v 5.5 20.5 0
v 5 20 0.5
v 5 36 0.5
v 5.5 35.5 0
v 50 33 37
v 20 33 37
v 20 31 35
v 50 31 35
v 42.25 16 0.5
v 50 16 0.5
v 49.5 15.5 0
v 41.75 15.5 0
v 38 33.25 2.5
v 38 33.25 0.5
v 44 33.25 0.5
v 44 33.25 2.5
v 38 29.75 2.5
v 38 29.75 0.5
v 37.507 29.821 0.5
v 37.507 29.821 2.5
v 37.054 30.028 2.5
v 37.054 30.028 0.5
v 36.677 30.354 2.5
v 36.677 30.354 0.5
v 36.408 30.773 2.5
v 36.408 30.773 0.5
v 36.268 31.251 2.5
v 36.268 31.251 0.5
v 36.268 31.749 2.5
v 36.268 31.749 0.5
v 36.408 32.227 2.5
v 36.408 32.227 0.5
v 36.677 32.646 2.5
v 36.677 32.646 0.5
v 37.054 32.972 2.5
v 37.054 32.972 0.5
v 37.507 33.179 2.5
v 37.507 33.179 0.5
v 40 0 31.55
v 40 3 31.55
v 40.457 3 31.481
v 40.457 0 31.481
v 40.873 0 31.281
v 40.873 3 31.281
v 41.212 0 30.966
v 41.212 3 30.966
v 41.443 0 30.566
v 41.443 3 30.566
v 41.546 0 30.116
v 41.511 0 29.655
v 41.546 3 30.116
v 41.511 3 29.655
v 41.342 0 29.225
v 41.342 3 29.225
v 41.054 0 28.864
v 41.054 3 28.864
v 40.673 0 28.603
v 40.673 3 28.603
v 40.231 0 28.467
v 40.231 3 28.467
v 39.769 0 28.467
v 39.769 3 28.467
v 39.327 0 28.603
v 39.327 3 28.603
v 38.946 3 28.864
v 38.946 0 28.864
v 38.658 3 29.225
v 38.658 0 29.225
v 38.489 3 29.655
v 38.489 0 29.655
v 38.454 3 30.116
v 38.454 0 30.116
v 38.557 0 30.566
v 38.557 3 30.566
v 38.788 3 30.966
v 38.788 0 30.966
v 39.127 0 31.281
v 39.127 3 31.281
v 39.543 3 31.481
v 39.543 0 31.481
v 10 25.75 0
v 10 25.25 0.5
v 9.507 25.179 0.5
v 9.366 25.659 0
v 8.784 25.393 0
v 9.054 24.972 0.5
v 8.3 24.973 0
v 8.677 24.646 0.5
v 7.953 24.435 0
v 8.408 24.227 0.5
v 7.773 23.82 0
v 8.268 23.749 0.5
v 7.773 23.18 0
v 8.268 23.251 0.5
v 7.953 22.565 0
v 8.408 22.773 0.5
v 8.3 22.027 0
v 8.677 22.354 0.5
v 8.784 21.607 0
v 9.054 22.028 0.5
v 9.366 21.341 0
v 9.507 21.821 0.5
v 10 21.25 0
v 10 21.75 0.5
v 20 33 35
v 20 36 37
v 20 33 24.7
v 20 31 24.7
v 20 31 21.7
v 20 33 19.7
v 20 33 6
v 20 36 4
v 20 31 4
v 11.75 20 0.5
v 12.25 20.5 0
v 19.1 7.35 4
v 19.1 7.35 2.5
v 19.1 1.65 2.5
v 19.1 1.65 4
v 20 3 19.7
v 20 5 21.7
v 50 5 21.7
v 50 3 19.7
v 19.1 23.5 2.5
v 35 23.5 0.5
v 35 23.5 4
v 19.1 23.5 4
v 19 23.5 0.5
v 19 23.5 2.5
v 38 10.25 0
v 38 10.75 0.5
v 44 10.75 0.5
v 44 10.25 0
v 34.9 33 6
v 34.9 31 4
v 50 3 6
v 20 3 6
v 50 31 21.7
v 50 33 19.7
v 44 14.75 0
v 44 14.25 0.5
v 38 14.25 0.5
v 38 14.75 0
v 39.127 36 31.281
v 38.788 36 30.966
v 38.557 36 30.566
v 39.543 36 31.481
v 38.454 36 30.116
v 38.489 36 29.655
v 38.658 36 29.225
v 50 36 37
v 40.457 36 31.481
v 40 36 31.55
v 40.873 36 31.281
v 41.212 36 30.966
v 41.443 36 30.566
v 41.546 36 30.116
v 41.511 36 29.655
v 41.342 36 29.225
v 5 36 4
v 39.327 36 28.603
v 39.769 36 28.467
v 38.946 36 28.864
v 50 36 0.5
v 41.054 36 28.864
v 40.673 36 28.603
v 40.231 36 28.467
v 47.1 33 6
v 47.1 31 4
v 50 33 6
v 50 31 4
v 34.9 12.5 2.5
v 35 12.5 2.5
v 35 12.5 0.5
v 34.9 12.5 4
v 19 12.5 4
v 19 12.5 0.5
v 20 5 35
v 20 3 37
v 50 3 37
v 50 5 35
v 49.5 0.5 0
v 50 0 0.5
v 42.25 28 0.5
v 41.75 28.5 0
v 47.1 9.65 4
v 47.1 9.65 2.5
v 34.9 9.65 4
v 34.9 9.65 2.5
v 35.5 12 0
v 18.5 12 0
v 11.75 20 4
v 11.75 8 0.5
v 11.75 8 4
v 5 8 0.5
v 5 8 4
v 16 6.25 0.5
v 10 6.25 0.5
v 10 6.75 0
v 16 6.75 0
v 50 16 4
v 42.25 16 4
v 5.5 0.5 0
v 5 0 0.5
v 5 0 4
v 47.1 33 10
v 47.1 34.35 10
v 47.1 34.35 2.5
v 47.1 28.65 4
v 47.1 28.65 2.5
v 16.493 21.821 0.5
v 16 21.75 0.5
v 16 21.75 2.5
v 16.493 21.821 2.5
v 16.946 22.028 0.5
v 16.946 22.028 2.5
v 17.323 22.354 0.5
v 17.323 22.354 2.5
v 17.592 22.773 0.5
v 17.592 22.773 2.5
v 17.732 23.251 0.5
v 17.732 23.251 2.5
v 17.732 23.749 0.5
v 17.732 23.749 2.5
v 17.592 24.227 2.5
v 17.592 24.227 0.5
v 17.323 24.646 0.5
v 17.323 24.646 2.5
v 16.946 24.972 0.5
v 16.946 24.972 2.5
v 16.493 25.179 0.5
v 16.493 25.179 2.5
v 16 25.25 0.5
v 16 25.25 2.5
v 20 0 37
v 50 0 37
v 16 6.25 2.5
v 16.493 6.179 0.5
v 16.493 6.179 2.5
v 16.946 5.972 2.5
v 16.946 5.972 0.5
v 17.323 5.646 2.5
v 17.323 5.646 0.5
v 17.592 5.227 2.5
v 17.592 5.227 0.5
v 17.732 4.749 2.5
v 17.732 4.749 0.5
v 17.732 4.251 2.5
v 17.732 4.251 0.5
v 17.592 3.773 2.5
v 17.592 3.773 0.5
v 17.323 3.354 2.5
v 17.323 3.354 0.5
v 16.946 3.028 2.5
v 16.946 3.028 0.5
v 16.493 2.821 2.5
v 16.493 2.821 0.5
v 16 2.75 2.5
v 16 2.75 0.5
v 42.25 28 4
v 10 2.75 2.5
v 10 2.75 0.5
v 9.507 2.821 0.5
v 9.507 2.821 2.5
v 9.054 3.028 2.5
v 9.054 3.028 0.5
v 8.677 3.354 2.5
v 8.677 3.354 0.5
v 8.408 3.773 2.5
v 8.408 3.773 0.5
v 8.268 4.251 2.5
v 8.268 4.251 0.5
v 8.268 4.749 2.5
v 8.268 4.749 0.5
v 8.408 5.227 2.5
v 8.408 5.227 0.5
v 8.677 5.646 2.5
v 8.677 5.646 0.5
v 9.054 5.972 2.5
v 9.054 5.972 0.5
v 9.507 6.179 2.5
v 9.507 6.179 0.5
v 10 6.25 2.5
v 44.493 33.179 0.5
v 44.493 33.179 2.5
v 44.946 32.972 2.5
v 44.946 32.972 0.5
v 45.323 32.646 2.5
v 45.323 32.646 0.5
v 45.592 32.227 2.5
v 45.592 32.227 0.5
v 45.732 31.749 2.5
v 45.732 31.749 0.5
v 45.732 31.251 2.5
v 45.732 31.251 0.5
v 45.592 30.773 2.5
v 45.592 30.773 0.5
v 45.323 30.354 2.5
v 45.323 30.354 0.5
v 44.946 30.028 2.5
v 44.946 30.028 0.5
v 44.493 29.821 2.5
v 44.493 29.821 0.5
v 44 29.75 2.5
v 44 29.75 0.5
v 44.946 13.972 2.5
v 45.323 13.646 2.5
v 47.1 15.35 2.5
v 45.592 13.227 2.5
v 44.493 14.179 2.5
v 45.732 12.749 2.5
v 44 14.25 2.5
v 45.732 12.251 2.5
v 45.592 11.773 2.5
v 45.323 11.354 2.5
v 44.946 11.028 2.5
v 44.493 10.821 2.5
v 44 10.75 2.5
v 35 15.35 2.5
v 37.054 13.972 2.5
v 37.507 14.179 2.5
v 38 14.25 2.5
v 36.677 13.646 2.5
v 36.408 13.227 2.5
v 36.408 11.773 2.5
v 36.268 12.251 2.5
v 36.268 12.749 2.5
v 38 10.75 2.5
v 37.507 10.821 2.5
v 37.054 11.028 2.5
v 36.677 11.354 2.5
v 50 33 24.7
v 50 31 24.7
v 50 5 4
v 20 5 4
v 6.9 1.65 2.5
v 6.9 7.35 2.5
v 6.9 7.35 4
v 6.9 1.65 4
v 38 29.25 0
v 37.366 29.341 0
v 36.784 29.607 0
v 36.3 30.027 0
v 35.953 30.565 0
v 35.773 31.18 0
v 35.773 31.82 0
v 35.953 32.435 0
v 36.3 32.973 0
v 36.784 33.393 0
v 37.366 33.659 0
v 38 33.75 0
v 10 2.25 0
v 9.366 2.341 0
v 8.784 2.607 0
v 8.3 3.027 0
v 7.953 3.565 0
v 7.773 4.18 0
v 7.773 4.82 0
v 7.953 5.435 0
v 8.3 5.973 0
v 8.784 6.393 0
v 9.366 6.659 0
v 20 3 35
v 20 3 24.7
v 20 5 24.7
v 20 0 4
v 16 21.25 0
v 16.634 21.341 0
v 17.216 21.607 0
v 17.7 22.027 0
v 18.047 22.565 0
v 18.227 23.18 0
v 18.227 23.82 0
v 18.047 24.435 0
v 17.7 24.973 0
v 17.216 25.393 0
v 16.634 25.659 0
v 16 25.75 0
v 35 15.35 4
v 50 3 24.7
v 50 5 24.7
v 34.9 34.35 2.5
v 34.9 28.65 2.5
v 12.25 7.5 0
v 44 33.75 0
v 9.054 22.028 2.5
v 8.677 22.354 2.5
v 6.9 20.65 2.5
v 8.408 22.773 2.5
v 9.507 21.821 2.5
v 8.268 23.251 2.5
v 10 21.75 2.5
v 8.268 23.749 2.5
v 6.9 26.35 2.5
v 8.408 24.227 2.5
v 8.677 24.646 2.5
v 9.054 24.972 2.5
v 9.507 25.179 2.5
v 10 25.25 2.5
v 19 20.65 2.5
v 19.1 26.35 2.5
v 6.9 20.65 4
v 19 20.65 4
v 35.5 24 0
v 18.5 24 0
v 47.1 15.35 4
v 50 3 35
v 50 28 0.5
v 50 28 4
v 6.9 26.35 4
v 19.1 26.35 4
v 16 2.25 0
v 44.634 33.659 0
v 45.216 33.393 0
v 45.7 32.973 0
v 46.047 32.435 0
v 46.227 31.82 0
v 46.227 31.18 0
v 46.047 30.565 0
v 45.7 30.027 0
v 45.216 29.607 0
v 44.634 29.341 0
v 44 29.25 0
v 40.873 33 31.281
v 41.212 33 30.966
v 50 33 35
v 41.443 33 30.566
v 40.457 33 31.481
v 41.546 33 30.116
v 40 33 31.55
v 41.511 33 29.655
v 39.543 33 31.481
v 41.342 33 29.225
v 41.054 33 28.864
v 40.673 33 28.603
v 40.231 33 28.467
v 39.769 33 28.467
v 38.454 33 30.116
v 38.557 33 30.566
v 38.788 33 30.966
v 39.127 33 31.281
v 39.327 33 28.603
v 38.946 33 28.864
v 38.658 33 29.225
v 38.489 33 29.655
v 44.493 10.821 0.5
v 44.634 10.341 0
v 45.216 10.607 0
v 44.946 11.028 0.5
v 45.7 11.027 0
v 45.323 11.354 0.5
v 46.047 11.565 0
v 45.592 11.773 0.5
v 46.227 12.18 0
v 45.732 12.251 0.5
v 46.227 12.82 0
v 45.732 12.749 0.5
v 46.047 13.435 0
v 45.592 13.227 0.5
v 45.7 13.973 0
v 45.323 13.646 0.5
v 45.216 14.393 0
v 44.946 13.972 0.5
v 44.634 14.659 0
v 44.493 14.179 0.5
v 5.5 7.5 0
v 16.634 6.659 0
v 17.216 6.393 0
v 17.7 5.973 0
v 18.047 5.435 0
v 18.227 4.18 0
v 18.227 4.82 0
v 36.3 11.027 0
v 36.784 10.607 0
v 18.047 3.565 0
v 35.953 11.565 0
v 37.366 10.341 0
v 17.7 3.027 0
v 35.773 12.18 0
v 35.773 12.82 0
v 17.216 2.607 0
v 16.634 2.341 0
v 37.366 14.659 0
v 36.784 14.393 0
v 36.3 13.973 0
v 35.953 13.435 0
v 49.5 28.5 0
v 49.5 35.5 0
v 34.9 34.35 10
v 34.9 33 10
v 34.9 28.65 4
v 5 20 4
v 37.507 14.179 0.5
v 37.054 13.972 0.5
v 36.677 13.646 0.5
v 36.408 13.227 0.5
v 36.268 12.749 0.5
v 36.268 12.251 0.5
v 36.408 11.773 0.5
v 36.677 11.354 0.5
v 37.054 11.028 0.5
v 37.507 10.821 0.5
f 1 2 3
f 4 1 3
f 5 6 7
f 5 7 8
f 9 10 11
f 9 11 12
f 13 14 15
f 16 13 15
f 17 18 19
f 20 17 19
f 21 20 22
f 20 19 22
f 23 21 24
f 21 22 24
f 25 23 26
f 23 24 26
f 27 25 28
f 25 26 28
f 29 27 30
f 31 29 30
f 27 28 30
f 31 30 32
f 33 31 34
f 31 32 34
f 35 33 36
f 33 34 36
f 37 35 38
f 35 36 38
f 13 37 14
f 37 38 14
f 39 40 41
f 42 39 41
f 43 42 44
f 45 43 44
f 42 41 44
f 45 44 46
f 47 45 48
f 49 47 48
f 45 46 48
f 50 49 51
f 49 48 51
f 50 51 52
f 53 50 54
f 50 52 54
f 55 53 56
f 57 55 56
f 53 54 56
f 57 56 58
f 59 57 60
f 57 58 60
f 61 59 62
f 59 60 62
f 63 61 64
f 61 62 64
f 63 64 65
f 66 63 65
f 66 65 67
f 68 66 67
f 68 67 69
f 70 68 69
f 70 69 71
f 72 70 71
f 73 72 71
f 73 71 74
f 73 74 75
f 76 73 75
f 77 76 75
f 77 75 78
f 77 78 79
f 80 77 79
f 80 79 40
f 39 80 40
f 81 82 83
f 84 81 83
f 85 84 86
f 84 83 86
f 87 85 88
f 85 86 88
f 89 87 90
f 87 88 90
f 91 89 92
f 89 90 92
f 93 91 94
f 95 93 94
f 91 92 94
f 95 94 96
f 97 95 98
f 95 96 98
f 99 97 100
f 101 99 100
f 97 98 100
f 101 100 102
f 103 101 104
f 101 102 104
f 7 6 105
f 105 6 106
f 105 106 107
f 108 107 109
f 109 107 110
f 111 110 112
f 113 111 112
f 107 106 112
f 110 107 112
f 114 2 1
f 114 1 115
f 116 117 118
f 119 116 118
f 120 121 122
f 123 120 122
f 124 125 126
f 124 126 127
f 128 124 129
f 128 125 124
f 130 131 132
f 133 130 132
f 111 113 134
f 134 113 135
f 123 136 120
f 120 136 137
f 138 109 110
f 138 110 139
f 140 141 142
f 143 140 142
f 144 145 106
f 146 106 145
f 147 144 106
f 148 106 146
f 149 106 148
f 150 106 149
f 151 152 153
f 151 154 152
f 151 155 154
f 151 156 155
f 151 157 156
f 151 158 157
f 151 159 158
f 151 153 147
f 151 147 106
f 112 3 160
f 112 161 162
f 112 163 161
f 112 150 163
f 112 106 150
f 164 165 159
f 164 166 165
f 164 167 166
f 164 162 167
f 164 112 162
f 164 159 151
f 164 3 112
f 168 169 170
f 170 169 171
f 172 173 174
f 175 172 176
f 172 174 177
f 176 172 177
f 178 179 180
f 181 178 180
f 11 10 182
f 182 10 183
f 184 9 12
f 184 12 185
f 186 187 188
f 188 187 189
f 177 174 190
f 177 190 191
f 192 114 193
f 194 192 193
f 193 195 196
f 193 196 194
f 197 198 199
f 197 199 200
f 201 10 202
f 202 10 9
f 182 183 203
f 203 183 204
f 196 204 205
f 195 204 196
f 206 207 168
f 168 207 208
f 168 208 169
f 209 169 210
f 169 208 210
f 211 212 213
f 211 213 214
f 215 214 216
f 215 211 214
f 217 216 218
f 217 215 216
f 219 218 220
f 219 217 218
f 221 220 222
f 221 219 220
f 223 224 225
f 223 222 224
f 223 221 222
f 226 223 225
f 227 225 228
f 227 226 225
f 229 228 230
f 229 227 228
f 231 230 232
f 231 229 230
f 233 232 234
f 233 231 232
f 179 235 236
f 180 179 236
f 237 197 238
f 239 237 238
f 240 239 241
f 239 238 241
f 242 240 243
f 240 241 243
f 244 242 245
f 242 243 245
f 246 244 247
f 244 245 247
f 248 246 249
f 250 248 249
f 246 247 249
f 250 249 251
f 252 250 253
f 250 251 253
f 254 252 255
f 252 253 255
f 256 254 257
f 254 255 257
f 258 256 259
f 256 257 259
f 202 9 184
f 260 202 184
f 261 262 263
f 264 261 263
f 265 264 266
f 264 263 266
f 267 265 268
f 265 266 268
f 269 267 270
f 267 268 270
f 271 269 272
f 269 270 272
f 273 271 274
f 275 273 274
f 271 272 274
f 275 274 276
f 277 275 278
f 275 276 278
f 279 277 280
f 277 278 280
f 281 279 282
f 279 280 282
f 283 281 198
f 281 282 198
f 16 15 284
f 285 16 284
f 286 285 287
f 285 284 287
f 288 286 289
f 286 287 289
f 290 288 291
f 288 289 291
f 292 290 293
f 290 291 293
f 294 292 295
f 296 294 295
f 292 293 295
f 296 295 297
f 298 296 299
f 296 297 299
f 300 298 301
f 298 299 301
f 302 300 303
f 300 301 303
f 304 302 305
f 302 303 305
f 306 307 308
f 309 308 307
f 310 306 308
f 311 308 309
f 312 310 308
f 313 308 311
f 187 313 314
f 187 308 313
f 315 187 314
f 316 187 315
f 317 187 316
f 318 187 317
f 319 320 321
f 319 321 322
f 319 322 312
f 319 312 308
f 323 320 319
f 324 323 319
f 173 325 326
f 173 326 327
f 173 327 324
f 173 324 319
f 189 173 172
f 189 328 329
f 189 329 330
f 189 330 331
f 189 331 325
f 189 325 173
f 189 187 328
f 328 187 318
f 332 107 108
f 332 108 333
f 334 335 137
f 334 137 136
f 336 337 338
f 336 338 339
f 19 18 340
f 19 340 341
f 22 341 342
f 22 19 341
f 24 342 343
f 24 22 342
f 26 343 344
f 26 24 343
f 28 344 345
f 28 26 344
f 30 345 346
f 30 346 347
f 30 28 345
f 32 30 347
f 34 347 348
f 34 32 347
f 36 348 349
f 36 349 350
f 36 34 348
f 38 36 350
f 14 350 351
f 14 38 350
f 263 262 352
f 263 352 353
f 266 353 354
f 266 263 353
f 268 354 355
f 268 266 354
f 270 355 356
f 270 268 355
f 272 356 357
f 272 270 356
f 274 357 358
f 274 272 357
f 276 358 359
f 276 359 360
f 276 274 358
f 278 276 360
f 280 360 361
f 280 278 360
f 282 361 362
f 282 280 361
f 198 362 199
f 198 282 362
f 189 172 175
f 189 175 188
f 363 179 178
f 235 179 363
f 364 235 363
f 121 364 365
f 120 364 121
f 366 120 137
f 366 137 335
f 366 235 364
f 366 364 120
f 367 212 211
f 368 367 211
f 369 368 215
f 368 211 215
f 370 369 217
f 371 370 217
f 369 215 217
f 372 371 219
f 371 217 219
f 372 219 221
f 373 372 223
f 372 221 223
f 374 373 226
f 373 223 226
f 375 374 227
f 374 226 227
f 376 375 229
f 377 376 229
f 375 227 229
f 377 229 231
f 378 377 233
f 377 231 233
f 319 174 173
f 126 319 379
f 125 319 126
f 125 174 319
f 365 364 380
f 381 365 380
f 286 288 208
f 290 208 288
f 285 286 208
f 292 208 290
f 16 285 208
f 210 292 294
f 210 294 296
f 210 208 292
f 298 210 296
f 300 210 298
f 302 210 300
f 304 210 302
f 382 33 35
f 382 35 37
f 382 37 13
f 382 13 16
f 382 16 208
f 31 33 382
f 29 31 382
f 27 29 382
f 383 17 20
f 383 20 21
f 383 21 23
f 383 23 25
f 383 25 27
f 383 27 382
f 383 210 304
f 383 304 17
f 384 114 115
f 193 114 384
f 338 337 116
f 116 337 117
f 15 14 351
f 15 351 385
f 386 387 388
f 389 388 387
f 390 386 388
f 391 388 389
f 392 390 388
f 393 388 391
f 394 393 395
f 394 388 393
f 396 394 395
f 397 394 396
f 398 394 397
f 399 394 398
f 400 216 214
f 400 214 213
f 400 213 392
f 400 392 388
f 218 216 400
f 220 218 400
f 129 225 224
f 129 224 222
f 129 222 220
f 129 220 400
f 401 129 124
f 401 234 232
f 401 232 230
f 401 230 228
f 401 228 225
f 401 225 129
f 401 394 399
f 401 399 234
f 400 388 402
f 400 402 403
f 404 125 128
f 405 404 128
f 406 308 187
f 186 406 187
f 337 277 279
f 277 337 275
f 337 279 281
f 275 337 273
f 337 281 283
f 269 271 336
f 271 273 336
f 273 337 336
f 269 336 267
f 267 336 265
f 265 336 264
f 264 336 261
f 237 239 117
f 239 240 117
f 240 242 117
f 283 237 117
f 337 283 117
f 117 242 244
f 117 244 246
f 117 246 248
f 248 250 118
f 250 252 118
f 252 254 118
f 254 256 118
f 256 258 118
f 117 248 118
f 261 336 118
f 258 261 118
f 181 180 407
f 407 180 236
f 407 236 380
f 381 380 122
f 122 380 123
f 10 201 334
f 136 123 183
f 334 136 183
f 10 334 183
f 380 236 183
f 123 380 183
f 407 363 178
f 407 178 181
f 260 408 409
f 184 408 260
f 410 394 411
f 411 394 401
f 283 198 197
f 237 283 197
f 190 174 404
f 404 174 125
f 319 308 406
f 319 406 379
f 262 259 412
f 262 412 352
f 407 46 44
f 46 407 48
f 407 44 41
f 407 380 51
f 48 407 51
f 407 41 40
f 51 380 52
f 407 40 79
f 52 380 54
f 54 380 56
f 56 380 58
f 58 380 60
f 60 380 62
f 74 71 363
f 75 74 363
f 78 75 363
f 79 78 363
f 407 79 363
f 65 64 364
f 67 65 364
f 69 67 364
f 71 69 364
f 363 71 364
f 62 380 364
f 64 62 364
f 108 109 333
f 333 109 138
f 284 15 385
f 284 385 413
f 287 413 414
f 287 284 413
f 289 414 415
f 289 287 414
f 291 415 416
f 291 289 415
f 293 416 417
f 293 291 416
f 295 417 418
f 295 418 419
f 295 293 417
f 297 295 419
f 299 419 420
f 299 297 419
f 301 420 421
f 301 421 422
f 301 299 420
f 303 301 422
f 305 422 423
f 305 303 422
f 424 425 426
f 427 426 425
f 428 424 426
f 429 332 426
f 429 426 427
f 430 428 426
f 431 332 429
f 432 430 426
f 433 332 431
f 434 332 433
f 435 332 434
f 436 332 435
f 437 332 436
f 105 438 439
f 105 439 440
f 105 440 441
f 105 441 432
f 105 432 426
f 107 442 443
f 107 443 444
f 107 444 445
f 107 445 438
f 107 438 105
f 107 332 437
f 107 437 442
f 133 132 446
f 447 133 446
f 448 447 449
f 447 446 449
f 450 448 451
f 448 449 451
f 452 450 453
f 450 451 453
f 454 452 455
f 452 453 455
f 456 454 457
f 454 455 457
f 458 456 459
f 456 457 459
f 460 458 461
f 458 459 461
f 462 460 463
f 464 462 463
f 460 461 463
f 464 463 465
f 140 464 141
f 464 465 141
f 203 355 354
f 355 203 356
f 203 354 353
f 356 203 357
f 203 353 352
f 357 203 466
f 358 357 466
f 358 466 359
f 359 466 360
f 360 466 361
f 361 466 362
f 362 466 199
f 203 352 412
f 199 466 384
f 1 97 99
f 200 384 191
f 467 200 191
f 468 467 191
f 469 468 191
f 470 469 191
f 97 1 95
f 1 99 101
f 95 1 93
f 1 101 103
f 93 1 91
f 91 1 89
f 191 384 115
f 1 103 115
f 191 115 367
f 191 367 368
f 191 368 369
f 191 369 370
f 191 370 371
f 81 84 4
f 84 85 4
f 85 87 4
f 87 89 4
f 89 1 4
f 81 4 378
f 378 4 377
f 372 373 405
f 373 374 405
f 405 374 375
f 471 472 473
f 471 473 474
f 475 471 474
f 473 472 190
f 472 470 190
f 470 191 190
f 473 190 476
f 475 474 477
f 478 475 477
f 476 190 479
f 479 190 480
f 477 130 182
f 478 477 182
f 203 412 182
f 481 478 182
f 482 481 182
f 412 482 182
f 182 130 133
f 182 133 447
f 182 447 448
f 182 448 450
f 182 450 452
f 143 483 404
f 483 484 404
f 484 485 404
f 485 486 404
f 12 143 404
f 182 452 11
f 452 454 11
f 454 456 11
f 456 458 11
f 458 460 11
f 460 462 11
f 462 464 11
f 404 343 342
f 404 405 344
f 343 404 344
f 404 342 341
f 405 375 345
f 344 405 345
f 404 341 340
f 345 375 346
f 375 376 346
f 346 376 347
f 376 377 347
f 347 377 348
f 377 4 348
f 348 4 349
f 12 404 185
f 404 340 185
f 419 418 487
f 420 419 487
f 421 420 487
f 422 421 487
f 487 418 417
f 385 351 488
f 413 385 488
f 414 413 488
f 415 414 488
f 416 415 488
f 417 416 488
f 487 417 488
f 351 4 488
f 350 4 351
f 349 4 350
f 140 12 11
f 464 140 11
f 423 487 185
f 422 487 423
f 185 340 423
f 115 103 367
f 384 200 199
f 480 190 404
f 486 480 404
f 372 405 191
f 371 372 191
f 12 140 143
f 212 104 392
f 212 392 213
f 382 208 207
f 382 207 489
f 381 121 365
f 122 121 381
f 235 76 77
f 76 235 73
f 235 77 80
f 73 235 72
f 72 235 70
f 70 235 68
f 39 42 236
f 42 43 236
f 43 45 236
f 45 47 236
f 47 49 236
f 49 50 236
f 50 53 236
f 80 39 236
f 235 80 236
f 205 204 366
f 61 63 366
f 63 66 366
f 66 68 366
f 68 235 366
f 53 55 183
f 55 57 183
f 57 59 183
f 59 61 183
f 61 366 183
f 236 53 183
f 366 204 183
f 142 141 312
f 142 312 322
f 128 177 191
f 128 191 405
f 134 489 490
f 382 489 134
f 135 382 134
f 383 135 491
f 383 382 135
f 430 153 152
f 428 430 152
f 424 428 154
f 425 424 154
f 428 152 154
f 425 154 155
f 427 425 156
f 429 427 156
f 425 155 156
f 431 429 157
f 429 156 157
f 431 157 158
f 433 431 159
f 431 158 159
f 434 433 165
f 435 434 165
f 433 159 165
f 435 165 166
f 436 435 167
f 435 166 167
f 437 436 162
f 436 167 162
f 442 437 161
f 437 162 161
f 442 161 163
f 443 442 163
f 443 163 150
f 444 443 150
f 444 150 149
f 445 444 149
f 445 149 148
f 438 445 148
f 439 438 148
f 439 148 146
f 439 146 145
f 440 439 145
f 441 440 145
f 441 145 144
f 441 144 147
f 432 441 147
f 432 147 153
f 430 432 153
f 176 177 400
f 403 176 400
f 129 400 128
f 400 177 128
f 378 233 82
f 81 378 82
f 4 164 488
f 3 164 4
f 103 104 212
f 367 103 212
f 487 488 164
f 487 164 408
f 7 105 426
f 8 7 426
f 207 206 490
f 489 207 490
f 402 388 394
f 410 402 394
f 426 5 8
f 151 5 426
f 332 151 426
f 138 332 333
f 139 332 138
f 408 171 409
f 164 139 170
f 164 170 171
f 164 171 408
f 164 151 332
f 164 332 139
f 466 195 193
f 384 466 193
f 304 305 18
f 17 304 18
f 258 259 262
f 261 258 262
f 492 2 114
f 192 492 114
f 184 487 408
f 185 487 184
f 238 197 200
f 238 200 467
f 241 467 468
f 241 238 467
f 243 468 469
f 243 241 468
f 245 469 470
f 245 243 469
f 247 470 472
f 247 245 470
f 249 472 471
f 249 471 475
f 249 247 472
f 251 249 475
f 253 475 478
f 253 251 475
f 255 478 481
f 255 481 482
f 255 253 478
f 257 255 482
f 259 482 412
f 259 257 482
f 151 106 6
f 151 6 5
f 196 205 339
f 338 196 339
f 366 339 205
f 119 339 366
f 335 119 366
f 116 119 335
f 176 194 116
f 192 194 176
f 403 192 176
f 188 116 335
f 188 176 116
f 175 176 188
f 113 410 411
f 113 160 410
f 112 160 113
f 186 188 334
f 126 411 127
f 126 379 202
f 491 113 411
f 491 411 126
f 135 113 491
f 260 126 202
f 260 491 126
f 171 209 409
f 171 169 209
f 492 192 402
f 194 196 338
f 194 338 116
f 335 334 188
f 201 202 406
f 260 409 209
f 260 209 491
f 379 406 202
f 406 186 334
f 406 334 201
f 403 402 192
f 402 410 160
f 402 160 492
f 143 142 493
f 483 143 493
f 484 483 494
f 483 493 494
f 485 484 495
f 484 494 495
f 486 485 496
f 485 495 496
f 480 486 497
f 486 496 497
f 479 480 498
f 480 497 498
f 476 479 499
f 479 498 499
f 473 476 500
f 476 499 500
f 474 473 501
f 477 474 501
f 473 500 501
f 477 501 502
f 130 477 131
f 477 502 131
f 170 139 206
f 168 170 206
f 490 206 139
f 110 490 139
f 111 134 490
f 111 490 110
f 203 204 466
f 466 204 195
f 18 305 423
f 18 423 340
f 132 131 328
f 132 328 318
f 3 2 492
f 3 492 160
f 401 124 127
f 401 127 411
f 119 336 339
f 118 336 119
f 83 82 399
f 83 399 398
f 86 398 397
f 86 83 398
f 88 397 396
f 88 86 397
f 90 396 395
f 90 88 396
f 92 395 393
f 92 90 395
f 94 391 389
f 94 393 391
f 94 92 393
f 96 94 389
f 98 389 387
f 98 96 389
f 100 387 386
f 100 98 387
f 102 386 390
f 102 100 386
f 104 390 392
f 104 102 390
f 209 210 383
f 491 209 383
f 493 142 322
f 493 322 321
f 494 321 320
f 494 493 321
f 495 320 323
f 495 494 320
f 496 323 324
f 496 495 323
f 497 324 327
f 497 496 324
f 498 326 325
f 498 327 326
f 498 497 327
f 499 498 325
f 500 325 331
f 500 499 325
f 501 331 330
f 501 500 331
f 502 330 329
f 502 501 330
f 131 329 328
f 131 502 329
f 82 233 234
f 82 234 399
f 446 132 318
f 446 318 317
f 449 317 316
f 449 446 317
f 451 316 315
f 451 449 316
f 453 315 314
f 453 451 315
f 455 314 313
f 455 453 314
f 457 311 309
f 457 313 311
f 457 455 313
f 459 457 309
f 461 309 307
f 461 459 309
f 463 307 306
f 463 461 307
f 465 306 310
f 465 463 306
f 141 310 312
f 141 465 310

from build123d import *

# Parameters (mm, degrees)
SKETCH1_W                   = 50
SKETCH1_H                   = 36
BOSS_EXTRUDE1_DEPTH         = 4
SKETCH2_W                   = 30
SKETCH2_H                   = 3
BOSS_EXTRUDE2_DEPTH         = 37
SKETCH3_R                   = 1.55
CUT_EXTRUDE1_DEPTH          = 72.867934435
SKETCH4_W                   = 16
SKETCH4_H                   = 11
CUT_EXTRUDE2_DEPTH          = 10
CUT_EXTRUDE3_DEPTH          = 10
SKETCH6_W                   = 20
SKETCH6_H                   = 12
CUT_EXTRUDE4_DEPTH          = 8
SKETCH7_W                   = 30
SKETCH7_H                   = 3
BOSS_EXTRUDE3_DEPTH         = 2
CHAMFER1_SIZE               = 2
CIRPATTERN1_COUNT           = 2
CIRPATTERN1_COPY_1_DEPTH    = 10
SKETCH9_W                   = 5
SKETCH9_H                   = 36
CUT_EXTRUDE6_DEPTH          = 10
CHAMFER2_SIZE               = 0.5
SKETCH10_W                  = 30
SKETCH10_H                  = 2
BOSS_EXTRUDE4_DEPTH         = 2
CHAMFER3_SIZE               = 2
CUT_EXTRUDE7_START          = -1.5
SKETCH12_W                  = 12.2
SKETCH12_H                  = 5.7
CUT_EXTRUDE7_DEPTH          = 7.5
CIRPATTERN2_COUNT           = 2
CIRPATTERN2_START           = -1.5
CIRPATTERN2_COPY_1_SKETCH_W = 12.2
CIRPATTERN2_COPY_1_SKETCH_H = 5.7
CIRPATTERN2_COPY_1_DEPTH    = 7.5
CHAMFER4_SIZE               = 2


with BuildPart() as part:
    # Sketch1 → Boss-Extrude1 (new body)
    with BuildSketch(Plane.XY):
        with Locations((25, 18)):
            Rectangle(SKETCH1_W, SKETCH1_H)
    extrude(amount=BOSS_EXTRUDE1_DEPTH)

    # Sketch2 → Boss-Extrude2 (add)
    with BuildSketch(Plane(origin=(0, 0, 0), x_dir=(-1, 0, 0), z_dir=(0, 0, -1))):
        with Locations((-35, 34.5)):
            Rectangle(SKETCH2_W, SKETCH2_H)
        with Locations((-35, 1.5)):
            Rectangle(SKETCH2_W, SKETCH2_H)
    extrude(amount=-BOSS_EXTRUDE2_DEPTH)

    # Sketch3 → Cut-Extrude1 (cut, through all)
    with BuildSketch(Plane(origin=(0, 36, 0), x_dir=(1, 0, 0), z_dir=(0, 1, 0))):
        with Locations(Location((40, -30, 0), (0, 0, 270))):
            Circle(SKETCH3_R)
    extrude(amount=-CUT_EXTRUDE1_DEPTH, mode=Mode.SUBTRACT)

    # Sketch4 → Cut-Extrude2 (cut)
    with BuildSketch(Plane(origin=(0, 0, 0), x_dir=(-1, 0, 0), z_dir=(0, 0, -1))):
        with Locations((-27, 18)):
            Rectangle(SKETCH4_W, SKETCH4_H)
    extrude(amount=-CUT_EXTRUDE2_DEPTH, mode=Mode.SUBTRACT)

    # Sketch5 → Cut-Extrude3 (cut)
    with BuildSketch(Plane(origin=(0, 0, 0), x_dir=(-1, 0, 0), z_dir=(0, 0, -1))):
        with BuildLine():
            Line((-44, 14.25), (-38, 14.25))
            ThreePointArc((-38, 14.25), (-36.25, 12.5), (-38, 10.75))
            Line((-38, 10.75), (-44, 10.75))
            ThreePointArc((-44, 10.75), (-45.75, 12.5), (-44, 14.25))
        make_face()
    cut_extrude3 = extrude(amount=-CUT_EXTRUDE3_DEPTH, mode=Mode.SUBTRACT)

    # Mirror1: Cut-Extrude3 across plane
    add(cut_extrude3.mirror(Plane.ZX.offset(22)), mode=Mode.SUBTRACT)

    # Sketch6 → Cut-Extrude4 (cut)
    with BuildSketch(Plane(origin=(0, 0, 0), x_dir=(-1, 0, 0), z_dir=(0, 0, -1))):
        with Locations((-52.25, 22)):
            Rectangle(SKETCH6_W, SKETCH6_H)
    cut_extrude4 = extrude(amount=-CUT_EXTRUDE4_DEPTH, mode=Mode.SUBTRACT)

    # Sketch7 → Boss-Extrude3 (add)
    with BuildSketch(Plane(origin=(0, 3, 0), x_dir=(1, 0, 0), z_dir=(0, 1, 0))):
        with Locations((35, -23.2)):
            Rectangle(SKETCH7_W, SKETCH7_H)
    boss_extrude3 = extrude(amount=BOSS_EXTRUDE3_DEPTH)

    # Mirror3: Boss-Extrude3 across plane
    add(boss_extrude3.mirror(Plane.ZX.offset(18)))

    # Chamfer1
    chamfer1_edges = [part.edges().sort_by_distance(p)[0] for p in [
        (35, 33, 21.7),
        (35, 3, 21.7),
    ]]
    chamfer(chamfer1_edges, length=CHAMFER1_SIZE - 0.0001)  # a hair under: the kernel refuses the full size

    # CirPattern1: Cut-Extrude3, Cut-Extrude4 ×2 about axis
    cirpattern1_axis = Axis((27, 18, 0), (0, 0, 1))
    add([cut_extrude3.rotate(cirpattern1_axis, i * 360 / CIRPATTERN1_COUNT) for i in range(1, CIRPATTERN1_COUNT)], mode=Mode.SUBTRACT)
    add([cut_extrude4.rotate(cirpattern1_axis, i * 360 / CIRPATTERN1_COUNT) for i in range(1, CIRPATTERN1_COUNT)], mode=Mode.SUBTRACT)

    # CirPattern1 copy 1 sketch → CirPattern1 copy 1 (cut)
    with BuildSketch(Plane(origin=(54, -8, 0), x_dir=(1, 0, 0), z_dir=(0, 0, -1))):
        with BuildLine():
            Line((-44, -14.25), (-38, -14.25))
            ThreePointArc((-38, -14.25), (-36.25, -12.5), (-38, -10.75))
            Line((-38, -10.75), (-44, -10.75))
            ThreePointArc((-44, -10.75), (-45.75, -12.5), (-44, -14.25))
        make_face()
    extrude(amount=-CIRPATTERN1_COPY_1_DEPTH, mode=Mode.SUBTRACT)

    # Sketch9 → Cut-Extrude6 (cut)
    with BuildSketch(Plane(origin=(0, 0, 0), x_dir=(-1, 0, 0), z_dir=(0, 0, -1))):
        with Locations((-2.5, 18)):
            Rectangle(SKETCH9_W, SKETCH9_H)
    extrude(amount=-CUT_EXTRUDE6_DEPTH, mode=Mode.SUBTRACT)

    # Chamfer2
    chamfer2_edges = [part.edges().sort_by_distance(p)[0] for p in [
        (41, 29.75, 0),
        (45.75, 31.5, 0),
        (36.25, 31.5, 0),
        (41, 33.25, 0),
        (50, 32, 0),
        (46.125, 28, 0),
        (46.125, 16, 0),
        (42.25, 22, 0),
        (8.25, 23.5, 0),
        (13, 25.25, 0),
        (17.75, 23.5, 0),
        (13, 21.75, 0),
        (8.25, 4.5, 0),
        (13, 2.75, 0),
        (17.75, 4.5, 0),
        (13, 6.25, 0),
        (8.375, 8, 0),
        (11.75, 14, 0),
        (8.375, 20, 0),
        (27.5, 0, 0),
        (5, 28, 0),
        (5, 4, 0),
        (27.5, 36, 0),
        (50, 8, 0),
        (35, 18, 0),
        (27, 12.5, 0),
        (19, 18, 0),
        (27, 23.5, 0),
        (45.75, 12.5, 0),
        (41, 10.75, 0),
        (36.25, 12.5, 0),
        (41, 14.25, 0),
    ]]
    chamfer(chamfer2_edges, length=CHAMFER2_SIZE)

    # Sketch10 → Boss-Extrude4 (add)
    with BuildSketch(Plane(origin=(0, 3, 0), x_dir=(1, 0, 0), z_dir=(0, 1, 0))):
        with Locations((35, -36)):
            Rectangle(SKETCH10_W, SKETCH10_H)
    boss_extrude4 = extrude(amount=BOSS_EXTRUDE4_DEPTH)

    # Mirror4: Boss-Extrude4 across plane
    add(boss_extrude4.mirror(Plane.ZX.offset(18)))

    # Chamfer3
    chamfer3_edges = [part.edges().sort_by_distance(p)[0] for p in [
        (35, 31, 37),
        (35, 5, 37),
    ]]
    chamfer(chamfer3_edges, length=CHAMFER3_SIZE - 0.0001)  # a hair under: the kernel refuses the full size

    # Sketch12 → Cut-Extrude7 (cut)
    with BuildSketch(Plane.XY.offset(4).offset(CUT_EXTRUDE7_START)):
        with Locations((13, 23.5)):
            Rectangle(SKETCH12_W, SKETCH12_H)
    cut_extrude7 = extrude(amount=CUT_EXTRUDE7_DEPTH, mode=Mode.SUBTRACT)

    # Mirror5: Cut-Extrude7 across plane
    add(cut_extrude7.mirror(Plane(origin=(0, 14, 0), x_dir=(0, 0, 1), z_dir=(0, -1, 0))), mode=Mode.SUBTRACT)

    # CirPattern2: Cut-Extrude7 ×2 about axis
    cirpattern2_axis = Axis((27, 18, 0), (0, 0, 1))
    for i in range(1, CIRPATTERN2_COUNT):
        add(cut_extrude7.rotate(cirpattern2_axis, i * 360 / CIRPATTERN2_COUNT), mode=Mode.SUBTRACT)

    # CirPattern2 copy 1 sketch → CirPattern2 copy 1 (cut)
    with BuildSketch(Plane(origin=(54, 8, 4), x_dir=(-1, 0, 0), z_dir=(0, 0, 1)).offset(CIRPATTERN2_START)):
        with Locations((13, -23.5)):
            Rectangle(CIRPATTERN2_COPY_1_SKETCH_W, CIRPATTERN2_COPY_1_SKETCH_H)
    extrude(amount=CIRPATTERN2_COPY_1_DEPTH, mode=Mode.SUBTRACT)

    # Chamfer4
    chamfer4_edges = [part.edges().sort_by_distance(p)[0] for p in [
        (48.55, 33, 4),
        (35, 3, 4),
        (27.45, 33, 4),
    ]]
    chamfer(chamfer4_edges, length=CHAMFER4_SIZE)


solid = part.part
